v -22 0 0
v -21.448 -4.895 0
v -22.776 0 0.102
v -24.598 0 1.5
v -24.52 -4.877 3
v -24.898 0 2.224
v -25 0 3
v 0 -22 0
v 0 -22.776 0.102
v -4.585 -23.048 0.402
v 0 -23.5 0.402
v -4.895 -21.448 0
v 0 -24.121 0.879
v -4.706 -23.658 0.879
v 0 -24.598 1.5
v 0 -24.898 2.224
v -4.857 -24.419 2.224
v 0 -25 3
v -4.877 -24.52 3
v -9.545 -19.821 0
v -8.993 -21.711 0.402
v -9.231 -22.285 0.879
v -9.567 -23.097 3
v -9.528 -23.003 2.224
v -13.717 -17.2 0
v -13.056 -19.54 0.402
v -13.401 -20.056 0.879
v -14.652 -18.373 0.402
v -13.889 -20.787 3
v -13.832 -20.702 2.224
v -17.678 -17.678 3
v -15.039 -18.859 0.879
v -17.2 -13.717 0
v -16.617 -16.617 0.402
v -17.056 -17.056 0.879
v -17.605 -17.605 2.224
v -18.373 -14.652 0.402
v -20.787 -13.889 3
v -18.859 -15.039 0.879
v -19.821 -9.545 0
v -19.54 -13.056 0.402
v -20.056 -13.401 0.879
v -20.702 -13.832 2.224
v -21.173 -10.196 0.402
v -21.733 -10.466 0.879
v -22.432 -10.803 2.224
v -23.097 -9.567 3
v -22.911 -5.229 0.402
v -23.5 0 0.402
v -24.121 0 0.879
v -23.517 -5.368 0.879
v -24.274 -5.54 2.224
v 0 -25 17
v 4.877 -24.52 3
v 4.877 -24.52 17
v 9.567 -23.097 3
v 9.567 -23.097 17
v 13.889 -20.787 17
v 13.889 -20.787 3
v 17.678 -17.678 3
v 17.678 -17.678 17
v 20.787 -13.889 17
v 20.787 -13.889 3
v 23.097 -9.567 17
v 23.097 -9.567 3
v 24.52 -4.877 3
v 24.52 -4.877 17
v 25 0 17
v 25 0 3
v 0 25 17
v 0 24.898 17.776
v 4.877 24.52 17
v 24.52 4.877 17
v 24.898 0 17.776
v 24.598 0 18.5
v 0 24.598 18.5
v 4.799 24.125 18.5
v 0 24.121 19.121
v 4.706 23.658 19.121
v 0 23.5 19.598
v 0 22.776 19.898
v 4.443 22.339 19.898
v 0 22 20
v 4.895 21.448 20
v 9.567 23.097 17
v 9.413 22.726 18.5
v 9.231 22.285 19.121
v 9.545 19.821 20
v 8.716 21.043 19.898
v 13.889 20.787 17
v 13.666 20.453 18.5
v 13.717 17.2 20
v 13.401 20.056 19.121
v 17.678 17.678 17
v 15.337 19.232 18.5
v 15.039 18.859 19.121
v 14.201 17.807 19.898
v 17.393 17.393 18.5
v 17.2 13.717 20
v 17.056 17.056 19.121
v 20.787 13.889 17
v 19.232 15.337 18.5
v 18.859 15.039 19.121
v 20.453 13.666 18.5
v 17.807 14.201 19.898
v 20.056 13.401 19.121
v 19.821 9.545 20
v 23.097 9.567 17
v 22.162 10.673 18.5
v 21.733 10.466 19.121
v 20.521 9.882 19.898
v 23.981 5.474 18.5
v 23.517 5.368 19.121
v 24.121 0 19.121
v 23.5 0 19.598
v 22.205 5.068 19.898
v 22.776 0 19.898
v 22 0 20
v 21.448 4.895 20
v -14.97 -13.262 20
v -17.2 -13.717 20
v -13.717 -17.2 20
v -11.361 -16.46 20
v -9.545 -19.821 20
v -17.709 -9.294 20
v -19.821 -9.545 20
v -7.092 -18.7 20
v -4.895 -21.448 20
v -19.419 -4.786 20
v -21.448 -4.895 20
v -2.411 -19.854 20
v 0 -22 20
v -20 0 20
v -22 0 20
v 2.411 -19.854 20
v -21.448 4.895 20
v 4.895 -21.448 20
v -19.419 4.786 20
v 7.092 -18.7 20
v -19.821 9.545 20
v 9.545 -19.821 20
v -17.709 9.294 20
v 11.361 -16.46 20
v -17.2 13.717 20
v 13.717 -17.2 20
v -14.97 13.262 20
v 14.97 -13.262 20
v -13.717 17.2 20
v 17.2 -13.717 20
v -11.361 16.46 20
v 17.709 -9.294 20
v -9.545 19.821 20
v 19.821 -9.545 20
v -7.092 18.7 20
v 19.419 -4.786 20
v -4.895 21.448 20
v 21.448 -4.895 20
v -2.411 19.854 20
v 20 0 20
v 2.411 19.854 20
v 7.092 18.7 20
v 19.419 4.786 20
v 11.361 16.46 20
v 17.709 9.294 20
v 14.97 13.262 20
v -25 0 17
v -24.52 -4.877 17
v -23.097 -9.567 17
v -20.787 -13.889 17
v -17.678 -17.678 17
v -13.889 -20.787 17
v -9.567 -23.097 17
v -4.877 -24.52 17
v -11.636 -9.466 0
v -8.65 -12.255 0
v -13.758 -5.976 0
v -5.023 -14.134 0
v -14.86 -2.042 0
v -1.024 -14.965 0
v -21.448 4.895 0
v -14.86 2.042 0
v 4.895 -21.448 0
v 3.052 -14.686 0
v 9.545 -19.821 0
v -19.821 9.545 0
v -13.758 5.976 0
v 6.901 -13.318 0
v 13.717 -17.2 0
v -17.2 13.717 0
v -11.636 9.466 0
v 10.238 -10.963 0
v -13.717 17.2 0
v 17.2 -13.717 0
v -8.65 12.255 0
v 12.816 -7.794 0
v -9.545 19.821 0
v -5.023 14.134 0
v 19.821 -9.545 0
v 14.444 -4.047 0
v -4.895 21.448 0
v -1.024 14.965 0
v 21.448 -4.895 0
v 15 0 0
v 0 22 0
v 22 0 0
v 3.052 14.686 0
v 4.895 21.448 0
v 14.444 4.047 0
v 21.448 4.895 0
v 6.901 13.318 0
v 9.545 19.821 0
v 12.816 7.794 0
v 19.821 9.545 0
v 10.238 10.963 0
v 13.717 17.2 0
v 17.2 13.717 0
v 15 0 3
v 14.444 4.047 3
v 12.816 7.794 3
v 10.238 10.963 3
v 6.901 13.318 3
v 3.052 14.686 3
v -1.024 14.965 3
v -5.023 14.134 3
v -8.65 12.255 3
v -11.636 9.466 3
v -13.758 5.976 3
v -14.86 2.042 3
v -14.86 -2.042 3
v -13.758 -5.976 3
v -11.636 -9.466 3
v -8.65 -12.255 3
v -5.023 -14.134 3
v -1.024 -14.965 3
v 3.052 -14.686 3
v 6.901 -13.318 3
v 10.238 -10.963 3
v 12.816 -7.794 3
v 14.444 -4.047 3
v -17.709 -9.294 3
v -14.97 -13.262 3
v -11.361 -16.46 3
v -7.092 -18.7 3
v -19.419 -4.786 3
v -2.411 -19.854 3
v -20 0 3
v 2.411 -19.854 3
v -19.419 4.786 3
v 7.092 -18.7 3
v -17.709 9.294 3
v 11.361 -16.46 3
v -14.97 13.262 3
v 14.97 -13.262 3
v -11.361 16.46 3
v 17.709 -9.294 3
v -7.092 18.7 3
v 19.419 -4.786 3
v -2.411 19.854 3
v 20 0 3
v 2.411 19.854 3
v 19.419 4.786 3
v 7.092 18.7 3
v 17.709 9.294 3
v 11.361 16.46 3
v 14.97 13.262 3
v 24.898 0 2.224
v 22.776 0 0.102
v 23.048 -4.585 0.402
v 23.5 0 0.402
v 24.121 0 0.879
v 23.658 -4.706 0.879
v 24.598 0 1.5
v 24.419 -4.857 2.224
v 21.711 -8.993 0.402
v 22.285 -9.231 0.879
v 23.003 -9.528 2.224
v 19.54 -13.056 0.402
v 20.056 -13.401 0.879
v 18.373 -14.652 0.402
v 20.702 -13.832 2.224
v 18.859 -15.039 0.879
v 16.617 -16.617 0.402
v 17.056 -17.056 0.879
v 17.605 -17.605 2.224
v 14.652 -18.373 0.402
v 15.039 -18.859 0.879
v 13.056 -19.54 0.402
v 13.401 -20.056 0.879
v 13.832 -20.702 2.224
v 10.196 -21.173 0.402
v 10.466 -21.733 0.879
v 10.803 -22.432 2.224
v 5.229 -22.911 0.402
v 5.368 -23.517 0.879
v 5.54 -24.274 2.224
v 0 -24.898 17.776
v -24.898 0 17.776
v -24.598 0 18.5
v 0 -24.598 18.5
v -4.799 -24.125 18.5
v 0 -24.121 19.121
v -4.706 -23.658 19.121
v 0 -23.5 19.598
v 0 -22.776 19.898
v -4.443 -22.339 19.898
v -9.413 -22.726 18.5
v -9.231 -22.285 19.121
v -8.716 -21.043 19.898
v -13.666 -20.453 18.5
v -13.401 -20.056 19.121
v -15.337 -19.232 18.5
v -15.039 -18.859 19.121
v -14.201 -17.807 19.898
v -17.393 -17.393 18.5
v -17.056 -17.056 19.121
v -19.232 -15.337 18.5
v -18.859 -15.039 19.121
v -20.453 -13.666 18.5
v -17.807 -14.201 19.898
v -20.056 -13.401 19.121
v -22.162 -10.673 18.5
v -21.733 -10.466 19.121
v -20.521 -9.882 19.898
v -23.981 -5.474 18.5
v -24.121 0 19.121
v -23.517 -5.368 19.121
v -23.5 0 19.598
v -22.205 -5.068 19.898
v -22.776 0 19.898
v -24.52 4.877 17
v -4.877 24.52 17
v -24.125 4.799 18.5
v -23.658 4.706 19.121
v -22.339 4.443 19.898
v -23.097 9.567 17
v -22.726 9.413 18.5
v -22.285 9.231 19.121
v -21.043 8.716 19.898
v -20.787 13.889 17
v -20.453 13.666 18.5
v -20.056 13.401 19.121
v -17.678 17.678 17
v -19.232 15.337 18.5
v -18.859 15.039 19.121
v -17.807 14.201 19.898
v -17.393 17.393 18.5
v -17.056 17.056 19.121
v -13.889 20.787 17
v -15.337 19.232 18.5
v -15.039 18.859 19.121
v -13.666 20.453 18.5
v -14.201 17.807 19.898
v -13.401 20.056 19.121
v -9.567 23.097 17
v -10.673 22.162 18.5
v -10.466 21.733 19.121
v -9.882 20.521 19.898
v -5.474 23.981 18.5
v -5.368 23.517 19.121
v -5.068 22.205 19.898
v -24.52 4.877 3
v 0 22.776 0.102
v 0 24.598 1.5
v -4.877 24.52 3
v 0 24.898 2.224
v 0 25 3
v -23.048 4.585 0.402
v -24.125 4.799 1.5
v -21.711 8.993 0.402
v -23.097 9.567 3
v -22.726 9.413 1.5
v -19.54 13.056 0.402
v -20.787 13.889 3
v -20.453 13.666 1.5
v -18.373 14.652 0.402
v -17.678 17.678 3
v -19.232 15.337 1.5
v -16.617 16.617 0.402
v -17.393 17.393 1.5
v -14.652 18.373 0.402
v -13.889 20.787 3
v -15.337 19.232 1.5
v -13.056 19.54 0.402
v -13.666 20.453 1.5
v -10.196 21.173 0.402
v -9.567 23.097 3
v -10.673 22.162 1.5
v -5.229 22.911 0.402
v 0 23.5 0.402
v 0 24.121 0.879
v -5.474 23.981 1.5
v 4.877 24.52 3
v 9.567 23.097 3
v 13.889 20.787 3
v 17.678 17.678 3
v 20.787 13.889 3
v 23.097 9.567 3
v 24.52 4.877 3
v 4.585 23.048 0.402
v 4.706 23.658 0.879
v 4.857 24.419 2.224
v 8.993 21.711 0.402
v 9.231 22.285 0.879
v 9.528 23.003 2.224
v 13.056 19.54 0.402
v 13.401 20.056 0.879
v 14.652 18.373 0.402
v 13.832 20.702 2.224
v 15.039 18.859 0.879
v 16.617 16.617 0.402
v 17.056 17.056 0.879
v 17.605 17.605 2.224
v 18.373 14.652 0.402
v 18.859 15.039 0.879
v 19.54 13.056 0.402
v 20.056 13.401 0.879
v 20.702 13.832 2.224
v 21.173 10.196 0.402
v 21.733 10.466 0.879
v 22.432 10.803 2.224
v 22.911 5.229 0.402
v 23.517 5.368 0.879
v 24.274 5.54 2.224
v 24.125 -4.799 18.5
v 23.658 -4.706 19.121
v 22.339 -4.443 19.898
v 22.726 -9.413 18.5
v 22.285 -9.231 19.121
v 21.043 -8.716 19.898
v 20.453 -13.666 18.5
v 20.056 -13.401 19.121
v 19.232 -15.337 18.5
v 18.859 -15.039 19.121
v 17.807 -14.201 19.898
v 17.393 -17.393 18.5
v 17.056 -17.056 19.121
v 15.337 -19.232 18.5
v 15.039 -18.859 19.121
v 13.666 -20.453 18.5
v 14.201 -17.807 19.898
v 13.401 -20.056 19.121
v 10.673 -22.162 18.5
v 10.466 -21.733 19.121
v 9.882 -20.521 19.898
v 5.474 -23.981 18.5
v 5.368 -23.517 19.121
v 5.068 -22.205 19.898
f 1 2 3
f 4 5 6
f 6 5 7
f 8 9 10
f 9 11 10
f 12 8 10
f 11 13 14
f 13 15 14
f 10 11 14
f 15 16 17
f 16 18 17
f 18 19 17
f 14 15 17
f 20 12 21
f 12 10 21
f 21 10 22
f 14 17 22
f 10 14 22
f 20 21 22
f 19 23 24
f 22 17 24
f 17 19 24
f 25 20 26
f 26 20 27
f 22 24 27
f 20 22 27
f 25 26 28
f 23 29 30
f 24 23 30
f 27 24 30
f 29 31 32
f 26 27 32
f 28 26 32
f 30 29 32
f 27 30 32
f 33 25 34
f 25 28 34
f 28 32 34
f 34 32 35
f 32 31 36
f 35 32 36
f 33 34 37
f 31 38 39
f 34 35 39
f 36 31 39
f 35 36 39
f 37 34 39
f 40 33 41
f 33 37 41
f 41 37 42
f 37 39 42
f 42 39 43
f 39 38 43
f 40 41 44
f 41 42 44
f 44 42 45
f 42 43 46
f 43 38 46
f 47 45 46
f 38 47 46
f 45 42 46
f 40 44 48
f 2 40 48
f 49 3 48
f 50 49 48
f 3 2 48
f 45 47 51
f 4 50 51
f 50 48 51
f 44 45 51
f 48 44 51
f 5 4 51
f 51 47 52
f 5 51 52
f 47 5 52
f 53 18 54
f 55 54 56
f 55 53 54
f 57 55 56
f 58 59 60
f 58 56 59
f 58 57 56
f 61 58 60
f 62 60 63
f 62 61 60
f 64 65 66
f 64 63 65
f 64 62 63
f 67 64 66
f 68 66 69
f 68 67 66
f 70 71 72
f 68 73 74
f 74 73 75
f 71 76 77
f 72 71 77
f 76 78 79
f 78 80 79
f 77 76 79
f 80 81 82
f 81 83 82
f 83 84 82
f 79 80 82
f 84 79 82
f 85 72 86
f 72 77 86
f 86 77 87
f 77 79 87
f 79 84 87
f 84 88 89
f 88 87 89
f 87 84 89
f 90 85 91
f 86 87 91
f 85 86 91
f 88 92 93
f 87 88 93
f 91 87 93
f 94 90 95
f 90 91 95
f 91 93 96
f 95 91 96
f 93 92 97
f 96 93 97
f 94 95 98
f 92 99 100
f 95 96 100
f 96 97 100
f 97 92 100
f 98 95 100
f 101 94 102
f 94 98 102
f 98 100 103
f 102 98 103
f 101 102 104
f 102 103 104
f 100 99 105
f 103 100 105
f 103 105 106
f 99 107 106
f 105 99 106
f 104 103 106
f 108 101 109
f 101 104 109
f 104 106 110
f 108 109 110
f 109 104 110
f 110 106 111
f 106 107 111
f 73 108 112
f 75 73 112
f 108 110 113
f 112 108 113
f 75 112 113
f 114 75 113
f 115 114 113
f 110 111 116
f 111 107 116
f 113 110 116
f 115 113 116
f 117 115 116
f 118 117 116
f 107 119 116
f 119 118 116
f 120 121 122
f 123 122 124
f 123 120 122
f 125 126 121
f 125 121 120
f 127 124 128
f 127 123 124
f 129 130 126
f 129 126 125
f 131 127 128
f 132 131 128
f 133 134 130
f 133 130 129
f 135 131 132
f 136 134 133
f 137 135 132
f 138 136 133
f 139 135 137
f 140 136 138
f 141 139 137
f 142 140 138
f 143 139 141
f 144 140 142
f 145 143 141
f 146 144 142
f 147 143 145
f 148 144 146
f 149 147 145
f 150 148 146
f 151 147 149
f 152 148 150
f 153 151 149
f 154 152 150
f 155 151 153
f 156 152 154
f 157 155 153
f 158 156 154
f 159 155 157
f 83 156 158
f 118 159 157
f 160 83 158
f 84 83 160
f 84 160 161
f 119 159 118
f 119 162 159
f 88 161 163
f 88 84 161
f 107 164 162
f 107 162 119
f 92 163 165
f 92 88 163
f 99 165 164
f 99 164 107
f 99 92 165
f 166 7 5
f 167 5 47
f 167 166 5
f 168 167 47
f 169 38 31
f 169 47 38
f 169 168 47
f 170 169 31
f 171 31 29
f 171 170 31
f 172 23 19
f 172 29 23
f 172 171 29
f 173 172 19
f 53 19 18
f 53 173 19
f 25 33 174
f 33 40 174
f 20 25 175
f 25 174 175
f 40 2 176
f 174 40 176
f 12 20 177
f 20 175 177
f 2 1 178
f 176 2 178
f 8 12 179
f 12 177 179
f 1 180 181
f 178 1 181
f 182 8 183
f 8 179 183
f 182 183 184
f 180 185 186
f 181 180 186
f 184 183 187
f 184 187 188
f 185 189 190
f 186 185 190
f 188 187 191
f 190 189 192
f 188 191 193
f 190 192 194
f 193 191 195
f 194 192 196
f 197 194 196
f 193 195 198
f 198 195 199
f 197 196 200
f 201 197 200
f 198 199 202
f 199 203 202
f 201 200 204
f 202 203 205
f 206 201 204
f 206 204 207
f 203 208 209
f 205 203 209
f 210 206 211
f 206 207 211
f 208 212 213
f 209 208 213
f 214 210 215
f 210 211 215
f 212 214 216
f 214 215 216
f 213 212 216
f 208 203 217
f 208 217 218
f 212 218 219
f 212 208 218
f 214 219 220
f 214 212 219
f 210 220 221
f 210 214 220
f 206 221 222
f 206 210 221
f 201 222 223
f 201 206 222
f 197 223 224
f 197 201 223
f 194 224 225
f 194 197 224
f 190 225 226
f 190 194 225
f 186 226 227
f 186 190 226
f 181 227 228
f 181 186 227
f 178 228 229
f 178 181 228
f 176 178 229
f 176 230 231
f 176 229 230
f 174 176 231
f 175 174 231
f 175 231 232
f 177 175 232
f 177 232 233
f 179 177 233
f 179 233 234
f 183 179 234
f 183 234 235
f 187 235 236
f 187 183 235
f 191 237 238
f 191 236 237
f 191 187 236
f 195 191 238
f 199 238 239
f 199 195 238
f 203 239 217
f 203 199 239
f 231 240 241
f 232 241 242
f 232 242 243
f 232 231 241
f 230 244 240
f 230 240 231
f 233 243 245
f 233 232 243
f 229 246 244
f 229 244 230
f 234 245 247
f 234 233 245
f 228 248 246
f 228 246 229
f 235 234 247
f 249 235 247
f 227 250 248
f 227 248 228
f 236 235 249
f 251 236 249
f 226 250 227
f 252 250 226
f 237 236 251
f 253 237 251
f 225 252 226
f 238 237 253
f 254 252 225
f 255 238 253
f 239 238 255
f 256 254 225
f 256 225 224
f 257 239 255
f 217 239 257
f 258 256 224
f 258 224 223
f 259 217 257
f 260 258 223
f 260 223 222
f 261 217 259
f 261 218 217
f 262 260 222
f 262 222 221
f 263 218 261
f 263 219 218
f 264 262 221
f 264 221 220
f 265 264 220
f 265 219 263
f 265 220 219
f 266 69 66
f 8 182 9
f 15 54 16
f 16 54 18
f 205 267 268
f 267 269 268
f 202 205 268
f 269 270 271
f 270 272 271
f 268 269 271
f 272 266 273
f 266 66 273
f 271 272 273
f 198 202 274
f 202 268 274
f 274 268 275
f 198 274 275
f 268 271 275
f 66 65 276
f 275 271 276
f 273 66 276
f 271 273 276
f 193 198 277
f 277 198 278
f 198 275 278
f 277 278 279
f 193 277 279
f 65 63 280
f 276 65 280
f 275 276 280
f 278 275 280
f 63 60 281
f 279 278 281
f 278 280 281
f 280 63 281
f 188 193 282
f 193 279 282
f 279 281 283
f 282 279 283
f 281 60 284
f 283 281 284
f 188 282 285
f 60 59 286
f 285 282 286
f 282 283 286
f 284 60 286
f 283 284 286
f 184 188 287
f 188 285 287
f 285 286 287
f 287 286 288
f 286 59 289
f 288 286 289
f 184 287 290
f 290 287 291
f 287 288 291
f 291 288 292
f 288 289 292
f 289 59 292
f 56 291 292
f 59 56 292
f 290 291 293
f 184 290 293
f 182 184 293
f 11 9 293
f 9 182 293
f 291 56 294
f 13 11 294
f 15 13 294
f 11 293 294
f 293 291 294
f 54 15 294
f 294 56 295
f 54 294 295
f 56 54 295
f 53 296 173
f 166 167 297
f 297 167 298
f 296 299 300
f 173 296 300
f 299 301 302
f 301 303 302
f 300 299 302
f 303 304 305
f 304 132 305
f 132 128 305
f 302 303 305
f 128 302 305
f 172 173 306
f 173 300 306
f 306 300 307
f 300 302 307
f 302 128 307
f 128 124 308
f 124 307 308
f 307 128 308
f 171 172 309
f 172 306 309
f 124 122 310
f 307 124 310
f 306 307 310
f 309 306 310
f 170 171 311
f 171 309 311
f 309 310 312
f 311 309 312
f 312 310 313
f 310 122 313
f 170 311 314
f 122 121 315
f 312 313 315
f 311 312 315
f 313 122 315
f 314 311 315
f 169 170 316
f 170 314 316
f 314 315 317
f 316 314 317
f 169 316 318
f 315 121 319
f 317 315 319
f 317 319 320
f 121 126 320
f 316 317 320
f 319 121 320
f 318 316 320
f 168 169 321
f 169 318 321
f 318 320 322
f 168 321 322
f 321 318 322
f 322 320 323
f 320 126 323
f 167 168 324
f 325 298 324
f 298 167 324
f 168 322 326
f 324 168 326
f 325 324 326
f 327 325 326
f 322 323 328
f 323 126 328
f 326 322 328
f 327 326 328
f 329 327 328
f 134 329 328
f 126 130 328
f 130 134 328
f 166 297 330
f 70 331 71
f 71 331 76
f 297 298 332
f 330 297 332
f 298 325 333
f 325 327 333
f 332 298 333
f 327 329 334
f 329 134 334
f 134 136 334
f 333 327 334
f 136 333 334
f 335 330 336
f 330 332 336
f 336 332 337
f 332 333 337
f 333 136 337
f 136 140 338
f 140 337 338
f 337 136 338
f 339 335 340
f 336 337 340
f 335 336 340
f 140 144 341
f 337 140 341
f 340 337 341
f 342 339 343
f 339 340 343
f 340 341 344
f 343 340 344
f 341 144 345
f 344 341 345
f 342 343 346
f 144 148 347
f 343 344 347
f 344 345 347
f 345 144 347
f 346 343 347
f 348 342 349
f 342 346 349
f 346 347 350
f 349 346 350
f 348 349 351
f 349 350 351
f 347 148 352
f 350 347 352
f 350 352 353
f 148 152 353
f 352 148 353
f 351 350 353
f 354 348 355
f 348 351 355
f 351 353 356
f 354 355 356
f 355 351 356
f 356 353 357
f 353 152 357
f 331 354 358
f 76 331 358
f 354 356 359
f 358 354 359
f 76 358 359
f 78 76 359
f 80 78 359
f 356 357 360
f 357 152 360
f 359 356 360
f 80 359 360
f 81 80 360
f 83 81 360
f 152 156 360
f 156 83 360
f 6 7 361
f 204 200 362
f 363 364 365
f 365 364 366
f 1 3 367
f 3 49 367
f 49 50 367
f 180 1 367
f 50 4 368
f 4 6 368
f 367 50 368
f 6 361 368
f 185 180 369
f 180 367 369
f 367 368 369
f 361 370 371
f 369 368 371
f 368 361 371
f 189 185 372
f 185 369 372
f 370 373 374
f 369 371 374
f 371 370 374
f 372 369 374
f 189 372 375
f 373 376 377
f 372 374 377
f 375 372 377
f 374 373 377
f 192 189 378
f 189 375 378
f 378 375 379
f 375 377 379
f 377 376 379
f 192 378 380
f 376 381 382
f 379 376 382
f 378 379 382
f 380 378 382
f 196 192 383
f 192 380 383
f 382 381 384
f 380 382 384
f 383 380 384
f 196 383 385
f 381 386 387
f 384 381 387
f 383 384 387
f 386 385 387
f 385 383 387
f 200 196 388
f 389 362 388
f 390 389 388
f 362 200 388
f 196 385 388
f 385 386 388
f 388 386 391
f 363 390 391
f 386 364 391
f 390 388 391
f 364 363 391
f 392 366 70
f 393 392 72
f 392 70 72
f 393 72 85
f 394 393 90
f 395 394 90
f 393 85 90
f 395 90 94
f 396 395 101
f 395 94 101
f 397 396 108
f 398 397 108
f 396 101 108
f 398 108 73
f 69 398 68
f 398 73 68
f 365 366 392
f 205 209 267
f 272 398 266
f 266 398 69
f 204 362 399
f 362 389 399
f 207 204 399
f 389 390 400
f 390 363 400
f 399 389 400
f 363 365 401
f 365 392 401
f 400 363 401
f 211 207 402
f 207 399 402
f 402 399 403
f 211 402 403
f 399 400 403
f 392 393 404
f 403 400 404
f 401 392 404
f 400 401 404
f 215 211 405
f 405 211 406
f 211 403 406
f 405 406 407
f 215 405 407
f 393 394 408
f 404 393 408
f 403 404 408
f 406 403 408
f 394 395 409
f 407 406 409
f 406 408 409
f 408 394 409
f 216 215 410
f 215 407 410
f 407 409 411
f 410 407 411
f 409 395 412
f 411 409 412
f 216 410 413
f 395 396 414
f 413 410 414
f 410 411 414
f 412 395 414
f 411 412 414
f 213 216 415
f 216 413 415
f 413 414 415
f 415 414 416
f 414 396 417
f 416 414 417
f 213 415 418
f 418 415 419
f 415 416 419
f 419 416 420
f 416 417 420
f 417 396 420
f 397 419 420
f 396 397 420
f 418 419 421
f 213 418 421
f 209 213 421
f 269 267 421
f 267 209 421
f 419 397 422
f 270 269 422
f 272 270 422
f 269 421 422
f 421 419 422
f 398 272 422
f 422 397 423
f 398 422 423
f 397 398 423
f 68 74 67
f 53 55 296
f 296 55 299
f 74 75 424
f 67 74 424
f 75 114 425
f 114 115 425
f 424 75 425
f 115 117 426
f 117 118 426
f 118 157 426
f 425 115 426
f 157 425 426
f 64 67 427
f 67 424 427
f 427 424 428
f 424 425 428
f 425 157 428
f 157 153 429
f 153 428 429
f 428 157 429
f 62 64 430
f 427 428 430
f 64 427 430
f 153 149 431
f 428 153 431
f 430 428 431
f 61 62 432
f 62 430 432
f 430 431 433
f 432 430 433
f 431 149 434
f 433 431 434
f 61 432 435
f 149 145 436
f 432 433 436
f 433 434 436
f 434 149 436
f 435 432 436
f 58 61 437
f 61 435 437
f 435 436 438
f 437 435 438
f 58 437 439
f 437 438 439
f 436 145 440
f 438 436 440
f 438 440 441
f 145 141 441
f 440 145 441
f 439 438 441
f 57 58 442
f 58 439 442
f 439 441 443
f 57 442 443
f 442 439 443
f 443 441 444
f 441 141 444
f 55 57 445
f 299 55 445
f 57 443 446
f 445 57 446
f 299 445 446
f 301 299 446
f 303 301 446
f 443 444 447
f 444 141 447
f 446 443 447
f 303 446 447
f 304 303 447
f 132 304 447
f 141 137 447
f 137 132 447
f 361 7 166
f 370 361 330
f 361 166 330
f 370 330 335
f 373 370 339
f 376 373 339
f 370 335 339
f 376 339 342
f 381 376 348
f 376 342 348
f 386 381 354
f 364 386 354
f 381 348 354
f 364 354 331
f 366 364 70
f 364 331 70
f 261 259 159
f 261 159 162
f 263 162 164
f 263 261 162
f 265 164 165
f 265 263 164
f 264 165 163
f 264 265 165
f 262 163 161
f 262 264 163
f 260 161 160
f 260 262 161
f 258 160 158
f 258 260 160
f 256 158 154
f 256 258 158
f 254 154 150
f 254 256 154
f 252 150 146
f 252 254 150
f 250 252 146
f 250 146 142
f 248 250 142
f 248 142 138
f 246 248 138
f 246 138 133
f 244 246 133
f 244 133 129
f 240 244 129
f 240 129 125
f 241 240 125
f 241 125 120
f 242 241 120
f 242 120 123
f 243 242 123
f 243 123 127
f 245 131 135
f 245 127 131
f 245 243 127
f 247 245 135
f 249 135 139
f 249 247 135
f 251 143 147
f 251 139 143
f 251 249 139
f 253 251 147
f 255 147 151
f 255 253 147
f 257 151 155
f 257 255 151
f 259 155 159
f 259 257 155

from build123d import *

# Parameters (mm, degrees)
F0_W     = 50
F0_H     = 50
F0_R     = 15
F1_DEPTH = 20
F2_R     = 20
F3_DEPTH = 20
F6_R     = 24.99999
F7_R     = 3


# Not quite as in the source:
# - a fillet or chamfer is up to 0.001 mm smaller than in the source, because OpenCascade refuses the exact size


with BuildPart() as f1:
    # F0 (on Top) → F1 (new body)
    with BuildSketch(Plane.XY):
        Rectangle(F0_W, F0_H)
        Circle(F0_R, mode=Mode.SUBTRACT)
    extrude(amount=F1_DEPTH)


with BuildPart() as f3:
    # F2 (on Top) → F3 (new body)
    with BuildSketch(Plane.XY):
        Circle(F2_R)
    extrude(amount=F3_DEPTH)


with BuildPart() as f3_1:
    # F4: moved
    add(f3.part.moved(Location((0, 0, 3))))


with BuildPart() as f1_1:
    add(f1.part)

    # F5: cut F3
    add(f3_1.part, mode=Mode.SUBTRACT)

    # F6 (radius 25 in the source; OpenCascade refuses exactly that, so slightly less here)
    f6_edges = [f1_1.edges().sort_by_distance(p)[0] for p in [
        (-25, 25, 10),
        (-25, -25, 10),
        (25, -25, 10),
        (25, 25, 10),
    ]]
    fillet(f6_edges, radius=F6_R)

    # F7
    f7_edges = [f1_1.edges().sort_by_distance(p)[0] for p in [
        (-17.677672, 17.677672, 0),
        (-17.677672, 17.677672, 20),
    ]]
    fillet(f7_edges, radius=F7_R)


solid = f1_1.part
